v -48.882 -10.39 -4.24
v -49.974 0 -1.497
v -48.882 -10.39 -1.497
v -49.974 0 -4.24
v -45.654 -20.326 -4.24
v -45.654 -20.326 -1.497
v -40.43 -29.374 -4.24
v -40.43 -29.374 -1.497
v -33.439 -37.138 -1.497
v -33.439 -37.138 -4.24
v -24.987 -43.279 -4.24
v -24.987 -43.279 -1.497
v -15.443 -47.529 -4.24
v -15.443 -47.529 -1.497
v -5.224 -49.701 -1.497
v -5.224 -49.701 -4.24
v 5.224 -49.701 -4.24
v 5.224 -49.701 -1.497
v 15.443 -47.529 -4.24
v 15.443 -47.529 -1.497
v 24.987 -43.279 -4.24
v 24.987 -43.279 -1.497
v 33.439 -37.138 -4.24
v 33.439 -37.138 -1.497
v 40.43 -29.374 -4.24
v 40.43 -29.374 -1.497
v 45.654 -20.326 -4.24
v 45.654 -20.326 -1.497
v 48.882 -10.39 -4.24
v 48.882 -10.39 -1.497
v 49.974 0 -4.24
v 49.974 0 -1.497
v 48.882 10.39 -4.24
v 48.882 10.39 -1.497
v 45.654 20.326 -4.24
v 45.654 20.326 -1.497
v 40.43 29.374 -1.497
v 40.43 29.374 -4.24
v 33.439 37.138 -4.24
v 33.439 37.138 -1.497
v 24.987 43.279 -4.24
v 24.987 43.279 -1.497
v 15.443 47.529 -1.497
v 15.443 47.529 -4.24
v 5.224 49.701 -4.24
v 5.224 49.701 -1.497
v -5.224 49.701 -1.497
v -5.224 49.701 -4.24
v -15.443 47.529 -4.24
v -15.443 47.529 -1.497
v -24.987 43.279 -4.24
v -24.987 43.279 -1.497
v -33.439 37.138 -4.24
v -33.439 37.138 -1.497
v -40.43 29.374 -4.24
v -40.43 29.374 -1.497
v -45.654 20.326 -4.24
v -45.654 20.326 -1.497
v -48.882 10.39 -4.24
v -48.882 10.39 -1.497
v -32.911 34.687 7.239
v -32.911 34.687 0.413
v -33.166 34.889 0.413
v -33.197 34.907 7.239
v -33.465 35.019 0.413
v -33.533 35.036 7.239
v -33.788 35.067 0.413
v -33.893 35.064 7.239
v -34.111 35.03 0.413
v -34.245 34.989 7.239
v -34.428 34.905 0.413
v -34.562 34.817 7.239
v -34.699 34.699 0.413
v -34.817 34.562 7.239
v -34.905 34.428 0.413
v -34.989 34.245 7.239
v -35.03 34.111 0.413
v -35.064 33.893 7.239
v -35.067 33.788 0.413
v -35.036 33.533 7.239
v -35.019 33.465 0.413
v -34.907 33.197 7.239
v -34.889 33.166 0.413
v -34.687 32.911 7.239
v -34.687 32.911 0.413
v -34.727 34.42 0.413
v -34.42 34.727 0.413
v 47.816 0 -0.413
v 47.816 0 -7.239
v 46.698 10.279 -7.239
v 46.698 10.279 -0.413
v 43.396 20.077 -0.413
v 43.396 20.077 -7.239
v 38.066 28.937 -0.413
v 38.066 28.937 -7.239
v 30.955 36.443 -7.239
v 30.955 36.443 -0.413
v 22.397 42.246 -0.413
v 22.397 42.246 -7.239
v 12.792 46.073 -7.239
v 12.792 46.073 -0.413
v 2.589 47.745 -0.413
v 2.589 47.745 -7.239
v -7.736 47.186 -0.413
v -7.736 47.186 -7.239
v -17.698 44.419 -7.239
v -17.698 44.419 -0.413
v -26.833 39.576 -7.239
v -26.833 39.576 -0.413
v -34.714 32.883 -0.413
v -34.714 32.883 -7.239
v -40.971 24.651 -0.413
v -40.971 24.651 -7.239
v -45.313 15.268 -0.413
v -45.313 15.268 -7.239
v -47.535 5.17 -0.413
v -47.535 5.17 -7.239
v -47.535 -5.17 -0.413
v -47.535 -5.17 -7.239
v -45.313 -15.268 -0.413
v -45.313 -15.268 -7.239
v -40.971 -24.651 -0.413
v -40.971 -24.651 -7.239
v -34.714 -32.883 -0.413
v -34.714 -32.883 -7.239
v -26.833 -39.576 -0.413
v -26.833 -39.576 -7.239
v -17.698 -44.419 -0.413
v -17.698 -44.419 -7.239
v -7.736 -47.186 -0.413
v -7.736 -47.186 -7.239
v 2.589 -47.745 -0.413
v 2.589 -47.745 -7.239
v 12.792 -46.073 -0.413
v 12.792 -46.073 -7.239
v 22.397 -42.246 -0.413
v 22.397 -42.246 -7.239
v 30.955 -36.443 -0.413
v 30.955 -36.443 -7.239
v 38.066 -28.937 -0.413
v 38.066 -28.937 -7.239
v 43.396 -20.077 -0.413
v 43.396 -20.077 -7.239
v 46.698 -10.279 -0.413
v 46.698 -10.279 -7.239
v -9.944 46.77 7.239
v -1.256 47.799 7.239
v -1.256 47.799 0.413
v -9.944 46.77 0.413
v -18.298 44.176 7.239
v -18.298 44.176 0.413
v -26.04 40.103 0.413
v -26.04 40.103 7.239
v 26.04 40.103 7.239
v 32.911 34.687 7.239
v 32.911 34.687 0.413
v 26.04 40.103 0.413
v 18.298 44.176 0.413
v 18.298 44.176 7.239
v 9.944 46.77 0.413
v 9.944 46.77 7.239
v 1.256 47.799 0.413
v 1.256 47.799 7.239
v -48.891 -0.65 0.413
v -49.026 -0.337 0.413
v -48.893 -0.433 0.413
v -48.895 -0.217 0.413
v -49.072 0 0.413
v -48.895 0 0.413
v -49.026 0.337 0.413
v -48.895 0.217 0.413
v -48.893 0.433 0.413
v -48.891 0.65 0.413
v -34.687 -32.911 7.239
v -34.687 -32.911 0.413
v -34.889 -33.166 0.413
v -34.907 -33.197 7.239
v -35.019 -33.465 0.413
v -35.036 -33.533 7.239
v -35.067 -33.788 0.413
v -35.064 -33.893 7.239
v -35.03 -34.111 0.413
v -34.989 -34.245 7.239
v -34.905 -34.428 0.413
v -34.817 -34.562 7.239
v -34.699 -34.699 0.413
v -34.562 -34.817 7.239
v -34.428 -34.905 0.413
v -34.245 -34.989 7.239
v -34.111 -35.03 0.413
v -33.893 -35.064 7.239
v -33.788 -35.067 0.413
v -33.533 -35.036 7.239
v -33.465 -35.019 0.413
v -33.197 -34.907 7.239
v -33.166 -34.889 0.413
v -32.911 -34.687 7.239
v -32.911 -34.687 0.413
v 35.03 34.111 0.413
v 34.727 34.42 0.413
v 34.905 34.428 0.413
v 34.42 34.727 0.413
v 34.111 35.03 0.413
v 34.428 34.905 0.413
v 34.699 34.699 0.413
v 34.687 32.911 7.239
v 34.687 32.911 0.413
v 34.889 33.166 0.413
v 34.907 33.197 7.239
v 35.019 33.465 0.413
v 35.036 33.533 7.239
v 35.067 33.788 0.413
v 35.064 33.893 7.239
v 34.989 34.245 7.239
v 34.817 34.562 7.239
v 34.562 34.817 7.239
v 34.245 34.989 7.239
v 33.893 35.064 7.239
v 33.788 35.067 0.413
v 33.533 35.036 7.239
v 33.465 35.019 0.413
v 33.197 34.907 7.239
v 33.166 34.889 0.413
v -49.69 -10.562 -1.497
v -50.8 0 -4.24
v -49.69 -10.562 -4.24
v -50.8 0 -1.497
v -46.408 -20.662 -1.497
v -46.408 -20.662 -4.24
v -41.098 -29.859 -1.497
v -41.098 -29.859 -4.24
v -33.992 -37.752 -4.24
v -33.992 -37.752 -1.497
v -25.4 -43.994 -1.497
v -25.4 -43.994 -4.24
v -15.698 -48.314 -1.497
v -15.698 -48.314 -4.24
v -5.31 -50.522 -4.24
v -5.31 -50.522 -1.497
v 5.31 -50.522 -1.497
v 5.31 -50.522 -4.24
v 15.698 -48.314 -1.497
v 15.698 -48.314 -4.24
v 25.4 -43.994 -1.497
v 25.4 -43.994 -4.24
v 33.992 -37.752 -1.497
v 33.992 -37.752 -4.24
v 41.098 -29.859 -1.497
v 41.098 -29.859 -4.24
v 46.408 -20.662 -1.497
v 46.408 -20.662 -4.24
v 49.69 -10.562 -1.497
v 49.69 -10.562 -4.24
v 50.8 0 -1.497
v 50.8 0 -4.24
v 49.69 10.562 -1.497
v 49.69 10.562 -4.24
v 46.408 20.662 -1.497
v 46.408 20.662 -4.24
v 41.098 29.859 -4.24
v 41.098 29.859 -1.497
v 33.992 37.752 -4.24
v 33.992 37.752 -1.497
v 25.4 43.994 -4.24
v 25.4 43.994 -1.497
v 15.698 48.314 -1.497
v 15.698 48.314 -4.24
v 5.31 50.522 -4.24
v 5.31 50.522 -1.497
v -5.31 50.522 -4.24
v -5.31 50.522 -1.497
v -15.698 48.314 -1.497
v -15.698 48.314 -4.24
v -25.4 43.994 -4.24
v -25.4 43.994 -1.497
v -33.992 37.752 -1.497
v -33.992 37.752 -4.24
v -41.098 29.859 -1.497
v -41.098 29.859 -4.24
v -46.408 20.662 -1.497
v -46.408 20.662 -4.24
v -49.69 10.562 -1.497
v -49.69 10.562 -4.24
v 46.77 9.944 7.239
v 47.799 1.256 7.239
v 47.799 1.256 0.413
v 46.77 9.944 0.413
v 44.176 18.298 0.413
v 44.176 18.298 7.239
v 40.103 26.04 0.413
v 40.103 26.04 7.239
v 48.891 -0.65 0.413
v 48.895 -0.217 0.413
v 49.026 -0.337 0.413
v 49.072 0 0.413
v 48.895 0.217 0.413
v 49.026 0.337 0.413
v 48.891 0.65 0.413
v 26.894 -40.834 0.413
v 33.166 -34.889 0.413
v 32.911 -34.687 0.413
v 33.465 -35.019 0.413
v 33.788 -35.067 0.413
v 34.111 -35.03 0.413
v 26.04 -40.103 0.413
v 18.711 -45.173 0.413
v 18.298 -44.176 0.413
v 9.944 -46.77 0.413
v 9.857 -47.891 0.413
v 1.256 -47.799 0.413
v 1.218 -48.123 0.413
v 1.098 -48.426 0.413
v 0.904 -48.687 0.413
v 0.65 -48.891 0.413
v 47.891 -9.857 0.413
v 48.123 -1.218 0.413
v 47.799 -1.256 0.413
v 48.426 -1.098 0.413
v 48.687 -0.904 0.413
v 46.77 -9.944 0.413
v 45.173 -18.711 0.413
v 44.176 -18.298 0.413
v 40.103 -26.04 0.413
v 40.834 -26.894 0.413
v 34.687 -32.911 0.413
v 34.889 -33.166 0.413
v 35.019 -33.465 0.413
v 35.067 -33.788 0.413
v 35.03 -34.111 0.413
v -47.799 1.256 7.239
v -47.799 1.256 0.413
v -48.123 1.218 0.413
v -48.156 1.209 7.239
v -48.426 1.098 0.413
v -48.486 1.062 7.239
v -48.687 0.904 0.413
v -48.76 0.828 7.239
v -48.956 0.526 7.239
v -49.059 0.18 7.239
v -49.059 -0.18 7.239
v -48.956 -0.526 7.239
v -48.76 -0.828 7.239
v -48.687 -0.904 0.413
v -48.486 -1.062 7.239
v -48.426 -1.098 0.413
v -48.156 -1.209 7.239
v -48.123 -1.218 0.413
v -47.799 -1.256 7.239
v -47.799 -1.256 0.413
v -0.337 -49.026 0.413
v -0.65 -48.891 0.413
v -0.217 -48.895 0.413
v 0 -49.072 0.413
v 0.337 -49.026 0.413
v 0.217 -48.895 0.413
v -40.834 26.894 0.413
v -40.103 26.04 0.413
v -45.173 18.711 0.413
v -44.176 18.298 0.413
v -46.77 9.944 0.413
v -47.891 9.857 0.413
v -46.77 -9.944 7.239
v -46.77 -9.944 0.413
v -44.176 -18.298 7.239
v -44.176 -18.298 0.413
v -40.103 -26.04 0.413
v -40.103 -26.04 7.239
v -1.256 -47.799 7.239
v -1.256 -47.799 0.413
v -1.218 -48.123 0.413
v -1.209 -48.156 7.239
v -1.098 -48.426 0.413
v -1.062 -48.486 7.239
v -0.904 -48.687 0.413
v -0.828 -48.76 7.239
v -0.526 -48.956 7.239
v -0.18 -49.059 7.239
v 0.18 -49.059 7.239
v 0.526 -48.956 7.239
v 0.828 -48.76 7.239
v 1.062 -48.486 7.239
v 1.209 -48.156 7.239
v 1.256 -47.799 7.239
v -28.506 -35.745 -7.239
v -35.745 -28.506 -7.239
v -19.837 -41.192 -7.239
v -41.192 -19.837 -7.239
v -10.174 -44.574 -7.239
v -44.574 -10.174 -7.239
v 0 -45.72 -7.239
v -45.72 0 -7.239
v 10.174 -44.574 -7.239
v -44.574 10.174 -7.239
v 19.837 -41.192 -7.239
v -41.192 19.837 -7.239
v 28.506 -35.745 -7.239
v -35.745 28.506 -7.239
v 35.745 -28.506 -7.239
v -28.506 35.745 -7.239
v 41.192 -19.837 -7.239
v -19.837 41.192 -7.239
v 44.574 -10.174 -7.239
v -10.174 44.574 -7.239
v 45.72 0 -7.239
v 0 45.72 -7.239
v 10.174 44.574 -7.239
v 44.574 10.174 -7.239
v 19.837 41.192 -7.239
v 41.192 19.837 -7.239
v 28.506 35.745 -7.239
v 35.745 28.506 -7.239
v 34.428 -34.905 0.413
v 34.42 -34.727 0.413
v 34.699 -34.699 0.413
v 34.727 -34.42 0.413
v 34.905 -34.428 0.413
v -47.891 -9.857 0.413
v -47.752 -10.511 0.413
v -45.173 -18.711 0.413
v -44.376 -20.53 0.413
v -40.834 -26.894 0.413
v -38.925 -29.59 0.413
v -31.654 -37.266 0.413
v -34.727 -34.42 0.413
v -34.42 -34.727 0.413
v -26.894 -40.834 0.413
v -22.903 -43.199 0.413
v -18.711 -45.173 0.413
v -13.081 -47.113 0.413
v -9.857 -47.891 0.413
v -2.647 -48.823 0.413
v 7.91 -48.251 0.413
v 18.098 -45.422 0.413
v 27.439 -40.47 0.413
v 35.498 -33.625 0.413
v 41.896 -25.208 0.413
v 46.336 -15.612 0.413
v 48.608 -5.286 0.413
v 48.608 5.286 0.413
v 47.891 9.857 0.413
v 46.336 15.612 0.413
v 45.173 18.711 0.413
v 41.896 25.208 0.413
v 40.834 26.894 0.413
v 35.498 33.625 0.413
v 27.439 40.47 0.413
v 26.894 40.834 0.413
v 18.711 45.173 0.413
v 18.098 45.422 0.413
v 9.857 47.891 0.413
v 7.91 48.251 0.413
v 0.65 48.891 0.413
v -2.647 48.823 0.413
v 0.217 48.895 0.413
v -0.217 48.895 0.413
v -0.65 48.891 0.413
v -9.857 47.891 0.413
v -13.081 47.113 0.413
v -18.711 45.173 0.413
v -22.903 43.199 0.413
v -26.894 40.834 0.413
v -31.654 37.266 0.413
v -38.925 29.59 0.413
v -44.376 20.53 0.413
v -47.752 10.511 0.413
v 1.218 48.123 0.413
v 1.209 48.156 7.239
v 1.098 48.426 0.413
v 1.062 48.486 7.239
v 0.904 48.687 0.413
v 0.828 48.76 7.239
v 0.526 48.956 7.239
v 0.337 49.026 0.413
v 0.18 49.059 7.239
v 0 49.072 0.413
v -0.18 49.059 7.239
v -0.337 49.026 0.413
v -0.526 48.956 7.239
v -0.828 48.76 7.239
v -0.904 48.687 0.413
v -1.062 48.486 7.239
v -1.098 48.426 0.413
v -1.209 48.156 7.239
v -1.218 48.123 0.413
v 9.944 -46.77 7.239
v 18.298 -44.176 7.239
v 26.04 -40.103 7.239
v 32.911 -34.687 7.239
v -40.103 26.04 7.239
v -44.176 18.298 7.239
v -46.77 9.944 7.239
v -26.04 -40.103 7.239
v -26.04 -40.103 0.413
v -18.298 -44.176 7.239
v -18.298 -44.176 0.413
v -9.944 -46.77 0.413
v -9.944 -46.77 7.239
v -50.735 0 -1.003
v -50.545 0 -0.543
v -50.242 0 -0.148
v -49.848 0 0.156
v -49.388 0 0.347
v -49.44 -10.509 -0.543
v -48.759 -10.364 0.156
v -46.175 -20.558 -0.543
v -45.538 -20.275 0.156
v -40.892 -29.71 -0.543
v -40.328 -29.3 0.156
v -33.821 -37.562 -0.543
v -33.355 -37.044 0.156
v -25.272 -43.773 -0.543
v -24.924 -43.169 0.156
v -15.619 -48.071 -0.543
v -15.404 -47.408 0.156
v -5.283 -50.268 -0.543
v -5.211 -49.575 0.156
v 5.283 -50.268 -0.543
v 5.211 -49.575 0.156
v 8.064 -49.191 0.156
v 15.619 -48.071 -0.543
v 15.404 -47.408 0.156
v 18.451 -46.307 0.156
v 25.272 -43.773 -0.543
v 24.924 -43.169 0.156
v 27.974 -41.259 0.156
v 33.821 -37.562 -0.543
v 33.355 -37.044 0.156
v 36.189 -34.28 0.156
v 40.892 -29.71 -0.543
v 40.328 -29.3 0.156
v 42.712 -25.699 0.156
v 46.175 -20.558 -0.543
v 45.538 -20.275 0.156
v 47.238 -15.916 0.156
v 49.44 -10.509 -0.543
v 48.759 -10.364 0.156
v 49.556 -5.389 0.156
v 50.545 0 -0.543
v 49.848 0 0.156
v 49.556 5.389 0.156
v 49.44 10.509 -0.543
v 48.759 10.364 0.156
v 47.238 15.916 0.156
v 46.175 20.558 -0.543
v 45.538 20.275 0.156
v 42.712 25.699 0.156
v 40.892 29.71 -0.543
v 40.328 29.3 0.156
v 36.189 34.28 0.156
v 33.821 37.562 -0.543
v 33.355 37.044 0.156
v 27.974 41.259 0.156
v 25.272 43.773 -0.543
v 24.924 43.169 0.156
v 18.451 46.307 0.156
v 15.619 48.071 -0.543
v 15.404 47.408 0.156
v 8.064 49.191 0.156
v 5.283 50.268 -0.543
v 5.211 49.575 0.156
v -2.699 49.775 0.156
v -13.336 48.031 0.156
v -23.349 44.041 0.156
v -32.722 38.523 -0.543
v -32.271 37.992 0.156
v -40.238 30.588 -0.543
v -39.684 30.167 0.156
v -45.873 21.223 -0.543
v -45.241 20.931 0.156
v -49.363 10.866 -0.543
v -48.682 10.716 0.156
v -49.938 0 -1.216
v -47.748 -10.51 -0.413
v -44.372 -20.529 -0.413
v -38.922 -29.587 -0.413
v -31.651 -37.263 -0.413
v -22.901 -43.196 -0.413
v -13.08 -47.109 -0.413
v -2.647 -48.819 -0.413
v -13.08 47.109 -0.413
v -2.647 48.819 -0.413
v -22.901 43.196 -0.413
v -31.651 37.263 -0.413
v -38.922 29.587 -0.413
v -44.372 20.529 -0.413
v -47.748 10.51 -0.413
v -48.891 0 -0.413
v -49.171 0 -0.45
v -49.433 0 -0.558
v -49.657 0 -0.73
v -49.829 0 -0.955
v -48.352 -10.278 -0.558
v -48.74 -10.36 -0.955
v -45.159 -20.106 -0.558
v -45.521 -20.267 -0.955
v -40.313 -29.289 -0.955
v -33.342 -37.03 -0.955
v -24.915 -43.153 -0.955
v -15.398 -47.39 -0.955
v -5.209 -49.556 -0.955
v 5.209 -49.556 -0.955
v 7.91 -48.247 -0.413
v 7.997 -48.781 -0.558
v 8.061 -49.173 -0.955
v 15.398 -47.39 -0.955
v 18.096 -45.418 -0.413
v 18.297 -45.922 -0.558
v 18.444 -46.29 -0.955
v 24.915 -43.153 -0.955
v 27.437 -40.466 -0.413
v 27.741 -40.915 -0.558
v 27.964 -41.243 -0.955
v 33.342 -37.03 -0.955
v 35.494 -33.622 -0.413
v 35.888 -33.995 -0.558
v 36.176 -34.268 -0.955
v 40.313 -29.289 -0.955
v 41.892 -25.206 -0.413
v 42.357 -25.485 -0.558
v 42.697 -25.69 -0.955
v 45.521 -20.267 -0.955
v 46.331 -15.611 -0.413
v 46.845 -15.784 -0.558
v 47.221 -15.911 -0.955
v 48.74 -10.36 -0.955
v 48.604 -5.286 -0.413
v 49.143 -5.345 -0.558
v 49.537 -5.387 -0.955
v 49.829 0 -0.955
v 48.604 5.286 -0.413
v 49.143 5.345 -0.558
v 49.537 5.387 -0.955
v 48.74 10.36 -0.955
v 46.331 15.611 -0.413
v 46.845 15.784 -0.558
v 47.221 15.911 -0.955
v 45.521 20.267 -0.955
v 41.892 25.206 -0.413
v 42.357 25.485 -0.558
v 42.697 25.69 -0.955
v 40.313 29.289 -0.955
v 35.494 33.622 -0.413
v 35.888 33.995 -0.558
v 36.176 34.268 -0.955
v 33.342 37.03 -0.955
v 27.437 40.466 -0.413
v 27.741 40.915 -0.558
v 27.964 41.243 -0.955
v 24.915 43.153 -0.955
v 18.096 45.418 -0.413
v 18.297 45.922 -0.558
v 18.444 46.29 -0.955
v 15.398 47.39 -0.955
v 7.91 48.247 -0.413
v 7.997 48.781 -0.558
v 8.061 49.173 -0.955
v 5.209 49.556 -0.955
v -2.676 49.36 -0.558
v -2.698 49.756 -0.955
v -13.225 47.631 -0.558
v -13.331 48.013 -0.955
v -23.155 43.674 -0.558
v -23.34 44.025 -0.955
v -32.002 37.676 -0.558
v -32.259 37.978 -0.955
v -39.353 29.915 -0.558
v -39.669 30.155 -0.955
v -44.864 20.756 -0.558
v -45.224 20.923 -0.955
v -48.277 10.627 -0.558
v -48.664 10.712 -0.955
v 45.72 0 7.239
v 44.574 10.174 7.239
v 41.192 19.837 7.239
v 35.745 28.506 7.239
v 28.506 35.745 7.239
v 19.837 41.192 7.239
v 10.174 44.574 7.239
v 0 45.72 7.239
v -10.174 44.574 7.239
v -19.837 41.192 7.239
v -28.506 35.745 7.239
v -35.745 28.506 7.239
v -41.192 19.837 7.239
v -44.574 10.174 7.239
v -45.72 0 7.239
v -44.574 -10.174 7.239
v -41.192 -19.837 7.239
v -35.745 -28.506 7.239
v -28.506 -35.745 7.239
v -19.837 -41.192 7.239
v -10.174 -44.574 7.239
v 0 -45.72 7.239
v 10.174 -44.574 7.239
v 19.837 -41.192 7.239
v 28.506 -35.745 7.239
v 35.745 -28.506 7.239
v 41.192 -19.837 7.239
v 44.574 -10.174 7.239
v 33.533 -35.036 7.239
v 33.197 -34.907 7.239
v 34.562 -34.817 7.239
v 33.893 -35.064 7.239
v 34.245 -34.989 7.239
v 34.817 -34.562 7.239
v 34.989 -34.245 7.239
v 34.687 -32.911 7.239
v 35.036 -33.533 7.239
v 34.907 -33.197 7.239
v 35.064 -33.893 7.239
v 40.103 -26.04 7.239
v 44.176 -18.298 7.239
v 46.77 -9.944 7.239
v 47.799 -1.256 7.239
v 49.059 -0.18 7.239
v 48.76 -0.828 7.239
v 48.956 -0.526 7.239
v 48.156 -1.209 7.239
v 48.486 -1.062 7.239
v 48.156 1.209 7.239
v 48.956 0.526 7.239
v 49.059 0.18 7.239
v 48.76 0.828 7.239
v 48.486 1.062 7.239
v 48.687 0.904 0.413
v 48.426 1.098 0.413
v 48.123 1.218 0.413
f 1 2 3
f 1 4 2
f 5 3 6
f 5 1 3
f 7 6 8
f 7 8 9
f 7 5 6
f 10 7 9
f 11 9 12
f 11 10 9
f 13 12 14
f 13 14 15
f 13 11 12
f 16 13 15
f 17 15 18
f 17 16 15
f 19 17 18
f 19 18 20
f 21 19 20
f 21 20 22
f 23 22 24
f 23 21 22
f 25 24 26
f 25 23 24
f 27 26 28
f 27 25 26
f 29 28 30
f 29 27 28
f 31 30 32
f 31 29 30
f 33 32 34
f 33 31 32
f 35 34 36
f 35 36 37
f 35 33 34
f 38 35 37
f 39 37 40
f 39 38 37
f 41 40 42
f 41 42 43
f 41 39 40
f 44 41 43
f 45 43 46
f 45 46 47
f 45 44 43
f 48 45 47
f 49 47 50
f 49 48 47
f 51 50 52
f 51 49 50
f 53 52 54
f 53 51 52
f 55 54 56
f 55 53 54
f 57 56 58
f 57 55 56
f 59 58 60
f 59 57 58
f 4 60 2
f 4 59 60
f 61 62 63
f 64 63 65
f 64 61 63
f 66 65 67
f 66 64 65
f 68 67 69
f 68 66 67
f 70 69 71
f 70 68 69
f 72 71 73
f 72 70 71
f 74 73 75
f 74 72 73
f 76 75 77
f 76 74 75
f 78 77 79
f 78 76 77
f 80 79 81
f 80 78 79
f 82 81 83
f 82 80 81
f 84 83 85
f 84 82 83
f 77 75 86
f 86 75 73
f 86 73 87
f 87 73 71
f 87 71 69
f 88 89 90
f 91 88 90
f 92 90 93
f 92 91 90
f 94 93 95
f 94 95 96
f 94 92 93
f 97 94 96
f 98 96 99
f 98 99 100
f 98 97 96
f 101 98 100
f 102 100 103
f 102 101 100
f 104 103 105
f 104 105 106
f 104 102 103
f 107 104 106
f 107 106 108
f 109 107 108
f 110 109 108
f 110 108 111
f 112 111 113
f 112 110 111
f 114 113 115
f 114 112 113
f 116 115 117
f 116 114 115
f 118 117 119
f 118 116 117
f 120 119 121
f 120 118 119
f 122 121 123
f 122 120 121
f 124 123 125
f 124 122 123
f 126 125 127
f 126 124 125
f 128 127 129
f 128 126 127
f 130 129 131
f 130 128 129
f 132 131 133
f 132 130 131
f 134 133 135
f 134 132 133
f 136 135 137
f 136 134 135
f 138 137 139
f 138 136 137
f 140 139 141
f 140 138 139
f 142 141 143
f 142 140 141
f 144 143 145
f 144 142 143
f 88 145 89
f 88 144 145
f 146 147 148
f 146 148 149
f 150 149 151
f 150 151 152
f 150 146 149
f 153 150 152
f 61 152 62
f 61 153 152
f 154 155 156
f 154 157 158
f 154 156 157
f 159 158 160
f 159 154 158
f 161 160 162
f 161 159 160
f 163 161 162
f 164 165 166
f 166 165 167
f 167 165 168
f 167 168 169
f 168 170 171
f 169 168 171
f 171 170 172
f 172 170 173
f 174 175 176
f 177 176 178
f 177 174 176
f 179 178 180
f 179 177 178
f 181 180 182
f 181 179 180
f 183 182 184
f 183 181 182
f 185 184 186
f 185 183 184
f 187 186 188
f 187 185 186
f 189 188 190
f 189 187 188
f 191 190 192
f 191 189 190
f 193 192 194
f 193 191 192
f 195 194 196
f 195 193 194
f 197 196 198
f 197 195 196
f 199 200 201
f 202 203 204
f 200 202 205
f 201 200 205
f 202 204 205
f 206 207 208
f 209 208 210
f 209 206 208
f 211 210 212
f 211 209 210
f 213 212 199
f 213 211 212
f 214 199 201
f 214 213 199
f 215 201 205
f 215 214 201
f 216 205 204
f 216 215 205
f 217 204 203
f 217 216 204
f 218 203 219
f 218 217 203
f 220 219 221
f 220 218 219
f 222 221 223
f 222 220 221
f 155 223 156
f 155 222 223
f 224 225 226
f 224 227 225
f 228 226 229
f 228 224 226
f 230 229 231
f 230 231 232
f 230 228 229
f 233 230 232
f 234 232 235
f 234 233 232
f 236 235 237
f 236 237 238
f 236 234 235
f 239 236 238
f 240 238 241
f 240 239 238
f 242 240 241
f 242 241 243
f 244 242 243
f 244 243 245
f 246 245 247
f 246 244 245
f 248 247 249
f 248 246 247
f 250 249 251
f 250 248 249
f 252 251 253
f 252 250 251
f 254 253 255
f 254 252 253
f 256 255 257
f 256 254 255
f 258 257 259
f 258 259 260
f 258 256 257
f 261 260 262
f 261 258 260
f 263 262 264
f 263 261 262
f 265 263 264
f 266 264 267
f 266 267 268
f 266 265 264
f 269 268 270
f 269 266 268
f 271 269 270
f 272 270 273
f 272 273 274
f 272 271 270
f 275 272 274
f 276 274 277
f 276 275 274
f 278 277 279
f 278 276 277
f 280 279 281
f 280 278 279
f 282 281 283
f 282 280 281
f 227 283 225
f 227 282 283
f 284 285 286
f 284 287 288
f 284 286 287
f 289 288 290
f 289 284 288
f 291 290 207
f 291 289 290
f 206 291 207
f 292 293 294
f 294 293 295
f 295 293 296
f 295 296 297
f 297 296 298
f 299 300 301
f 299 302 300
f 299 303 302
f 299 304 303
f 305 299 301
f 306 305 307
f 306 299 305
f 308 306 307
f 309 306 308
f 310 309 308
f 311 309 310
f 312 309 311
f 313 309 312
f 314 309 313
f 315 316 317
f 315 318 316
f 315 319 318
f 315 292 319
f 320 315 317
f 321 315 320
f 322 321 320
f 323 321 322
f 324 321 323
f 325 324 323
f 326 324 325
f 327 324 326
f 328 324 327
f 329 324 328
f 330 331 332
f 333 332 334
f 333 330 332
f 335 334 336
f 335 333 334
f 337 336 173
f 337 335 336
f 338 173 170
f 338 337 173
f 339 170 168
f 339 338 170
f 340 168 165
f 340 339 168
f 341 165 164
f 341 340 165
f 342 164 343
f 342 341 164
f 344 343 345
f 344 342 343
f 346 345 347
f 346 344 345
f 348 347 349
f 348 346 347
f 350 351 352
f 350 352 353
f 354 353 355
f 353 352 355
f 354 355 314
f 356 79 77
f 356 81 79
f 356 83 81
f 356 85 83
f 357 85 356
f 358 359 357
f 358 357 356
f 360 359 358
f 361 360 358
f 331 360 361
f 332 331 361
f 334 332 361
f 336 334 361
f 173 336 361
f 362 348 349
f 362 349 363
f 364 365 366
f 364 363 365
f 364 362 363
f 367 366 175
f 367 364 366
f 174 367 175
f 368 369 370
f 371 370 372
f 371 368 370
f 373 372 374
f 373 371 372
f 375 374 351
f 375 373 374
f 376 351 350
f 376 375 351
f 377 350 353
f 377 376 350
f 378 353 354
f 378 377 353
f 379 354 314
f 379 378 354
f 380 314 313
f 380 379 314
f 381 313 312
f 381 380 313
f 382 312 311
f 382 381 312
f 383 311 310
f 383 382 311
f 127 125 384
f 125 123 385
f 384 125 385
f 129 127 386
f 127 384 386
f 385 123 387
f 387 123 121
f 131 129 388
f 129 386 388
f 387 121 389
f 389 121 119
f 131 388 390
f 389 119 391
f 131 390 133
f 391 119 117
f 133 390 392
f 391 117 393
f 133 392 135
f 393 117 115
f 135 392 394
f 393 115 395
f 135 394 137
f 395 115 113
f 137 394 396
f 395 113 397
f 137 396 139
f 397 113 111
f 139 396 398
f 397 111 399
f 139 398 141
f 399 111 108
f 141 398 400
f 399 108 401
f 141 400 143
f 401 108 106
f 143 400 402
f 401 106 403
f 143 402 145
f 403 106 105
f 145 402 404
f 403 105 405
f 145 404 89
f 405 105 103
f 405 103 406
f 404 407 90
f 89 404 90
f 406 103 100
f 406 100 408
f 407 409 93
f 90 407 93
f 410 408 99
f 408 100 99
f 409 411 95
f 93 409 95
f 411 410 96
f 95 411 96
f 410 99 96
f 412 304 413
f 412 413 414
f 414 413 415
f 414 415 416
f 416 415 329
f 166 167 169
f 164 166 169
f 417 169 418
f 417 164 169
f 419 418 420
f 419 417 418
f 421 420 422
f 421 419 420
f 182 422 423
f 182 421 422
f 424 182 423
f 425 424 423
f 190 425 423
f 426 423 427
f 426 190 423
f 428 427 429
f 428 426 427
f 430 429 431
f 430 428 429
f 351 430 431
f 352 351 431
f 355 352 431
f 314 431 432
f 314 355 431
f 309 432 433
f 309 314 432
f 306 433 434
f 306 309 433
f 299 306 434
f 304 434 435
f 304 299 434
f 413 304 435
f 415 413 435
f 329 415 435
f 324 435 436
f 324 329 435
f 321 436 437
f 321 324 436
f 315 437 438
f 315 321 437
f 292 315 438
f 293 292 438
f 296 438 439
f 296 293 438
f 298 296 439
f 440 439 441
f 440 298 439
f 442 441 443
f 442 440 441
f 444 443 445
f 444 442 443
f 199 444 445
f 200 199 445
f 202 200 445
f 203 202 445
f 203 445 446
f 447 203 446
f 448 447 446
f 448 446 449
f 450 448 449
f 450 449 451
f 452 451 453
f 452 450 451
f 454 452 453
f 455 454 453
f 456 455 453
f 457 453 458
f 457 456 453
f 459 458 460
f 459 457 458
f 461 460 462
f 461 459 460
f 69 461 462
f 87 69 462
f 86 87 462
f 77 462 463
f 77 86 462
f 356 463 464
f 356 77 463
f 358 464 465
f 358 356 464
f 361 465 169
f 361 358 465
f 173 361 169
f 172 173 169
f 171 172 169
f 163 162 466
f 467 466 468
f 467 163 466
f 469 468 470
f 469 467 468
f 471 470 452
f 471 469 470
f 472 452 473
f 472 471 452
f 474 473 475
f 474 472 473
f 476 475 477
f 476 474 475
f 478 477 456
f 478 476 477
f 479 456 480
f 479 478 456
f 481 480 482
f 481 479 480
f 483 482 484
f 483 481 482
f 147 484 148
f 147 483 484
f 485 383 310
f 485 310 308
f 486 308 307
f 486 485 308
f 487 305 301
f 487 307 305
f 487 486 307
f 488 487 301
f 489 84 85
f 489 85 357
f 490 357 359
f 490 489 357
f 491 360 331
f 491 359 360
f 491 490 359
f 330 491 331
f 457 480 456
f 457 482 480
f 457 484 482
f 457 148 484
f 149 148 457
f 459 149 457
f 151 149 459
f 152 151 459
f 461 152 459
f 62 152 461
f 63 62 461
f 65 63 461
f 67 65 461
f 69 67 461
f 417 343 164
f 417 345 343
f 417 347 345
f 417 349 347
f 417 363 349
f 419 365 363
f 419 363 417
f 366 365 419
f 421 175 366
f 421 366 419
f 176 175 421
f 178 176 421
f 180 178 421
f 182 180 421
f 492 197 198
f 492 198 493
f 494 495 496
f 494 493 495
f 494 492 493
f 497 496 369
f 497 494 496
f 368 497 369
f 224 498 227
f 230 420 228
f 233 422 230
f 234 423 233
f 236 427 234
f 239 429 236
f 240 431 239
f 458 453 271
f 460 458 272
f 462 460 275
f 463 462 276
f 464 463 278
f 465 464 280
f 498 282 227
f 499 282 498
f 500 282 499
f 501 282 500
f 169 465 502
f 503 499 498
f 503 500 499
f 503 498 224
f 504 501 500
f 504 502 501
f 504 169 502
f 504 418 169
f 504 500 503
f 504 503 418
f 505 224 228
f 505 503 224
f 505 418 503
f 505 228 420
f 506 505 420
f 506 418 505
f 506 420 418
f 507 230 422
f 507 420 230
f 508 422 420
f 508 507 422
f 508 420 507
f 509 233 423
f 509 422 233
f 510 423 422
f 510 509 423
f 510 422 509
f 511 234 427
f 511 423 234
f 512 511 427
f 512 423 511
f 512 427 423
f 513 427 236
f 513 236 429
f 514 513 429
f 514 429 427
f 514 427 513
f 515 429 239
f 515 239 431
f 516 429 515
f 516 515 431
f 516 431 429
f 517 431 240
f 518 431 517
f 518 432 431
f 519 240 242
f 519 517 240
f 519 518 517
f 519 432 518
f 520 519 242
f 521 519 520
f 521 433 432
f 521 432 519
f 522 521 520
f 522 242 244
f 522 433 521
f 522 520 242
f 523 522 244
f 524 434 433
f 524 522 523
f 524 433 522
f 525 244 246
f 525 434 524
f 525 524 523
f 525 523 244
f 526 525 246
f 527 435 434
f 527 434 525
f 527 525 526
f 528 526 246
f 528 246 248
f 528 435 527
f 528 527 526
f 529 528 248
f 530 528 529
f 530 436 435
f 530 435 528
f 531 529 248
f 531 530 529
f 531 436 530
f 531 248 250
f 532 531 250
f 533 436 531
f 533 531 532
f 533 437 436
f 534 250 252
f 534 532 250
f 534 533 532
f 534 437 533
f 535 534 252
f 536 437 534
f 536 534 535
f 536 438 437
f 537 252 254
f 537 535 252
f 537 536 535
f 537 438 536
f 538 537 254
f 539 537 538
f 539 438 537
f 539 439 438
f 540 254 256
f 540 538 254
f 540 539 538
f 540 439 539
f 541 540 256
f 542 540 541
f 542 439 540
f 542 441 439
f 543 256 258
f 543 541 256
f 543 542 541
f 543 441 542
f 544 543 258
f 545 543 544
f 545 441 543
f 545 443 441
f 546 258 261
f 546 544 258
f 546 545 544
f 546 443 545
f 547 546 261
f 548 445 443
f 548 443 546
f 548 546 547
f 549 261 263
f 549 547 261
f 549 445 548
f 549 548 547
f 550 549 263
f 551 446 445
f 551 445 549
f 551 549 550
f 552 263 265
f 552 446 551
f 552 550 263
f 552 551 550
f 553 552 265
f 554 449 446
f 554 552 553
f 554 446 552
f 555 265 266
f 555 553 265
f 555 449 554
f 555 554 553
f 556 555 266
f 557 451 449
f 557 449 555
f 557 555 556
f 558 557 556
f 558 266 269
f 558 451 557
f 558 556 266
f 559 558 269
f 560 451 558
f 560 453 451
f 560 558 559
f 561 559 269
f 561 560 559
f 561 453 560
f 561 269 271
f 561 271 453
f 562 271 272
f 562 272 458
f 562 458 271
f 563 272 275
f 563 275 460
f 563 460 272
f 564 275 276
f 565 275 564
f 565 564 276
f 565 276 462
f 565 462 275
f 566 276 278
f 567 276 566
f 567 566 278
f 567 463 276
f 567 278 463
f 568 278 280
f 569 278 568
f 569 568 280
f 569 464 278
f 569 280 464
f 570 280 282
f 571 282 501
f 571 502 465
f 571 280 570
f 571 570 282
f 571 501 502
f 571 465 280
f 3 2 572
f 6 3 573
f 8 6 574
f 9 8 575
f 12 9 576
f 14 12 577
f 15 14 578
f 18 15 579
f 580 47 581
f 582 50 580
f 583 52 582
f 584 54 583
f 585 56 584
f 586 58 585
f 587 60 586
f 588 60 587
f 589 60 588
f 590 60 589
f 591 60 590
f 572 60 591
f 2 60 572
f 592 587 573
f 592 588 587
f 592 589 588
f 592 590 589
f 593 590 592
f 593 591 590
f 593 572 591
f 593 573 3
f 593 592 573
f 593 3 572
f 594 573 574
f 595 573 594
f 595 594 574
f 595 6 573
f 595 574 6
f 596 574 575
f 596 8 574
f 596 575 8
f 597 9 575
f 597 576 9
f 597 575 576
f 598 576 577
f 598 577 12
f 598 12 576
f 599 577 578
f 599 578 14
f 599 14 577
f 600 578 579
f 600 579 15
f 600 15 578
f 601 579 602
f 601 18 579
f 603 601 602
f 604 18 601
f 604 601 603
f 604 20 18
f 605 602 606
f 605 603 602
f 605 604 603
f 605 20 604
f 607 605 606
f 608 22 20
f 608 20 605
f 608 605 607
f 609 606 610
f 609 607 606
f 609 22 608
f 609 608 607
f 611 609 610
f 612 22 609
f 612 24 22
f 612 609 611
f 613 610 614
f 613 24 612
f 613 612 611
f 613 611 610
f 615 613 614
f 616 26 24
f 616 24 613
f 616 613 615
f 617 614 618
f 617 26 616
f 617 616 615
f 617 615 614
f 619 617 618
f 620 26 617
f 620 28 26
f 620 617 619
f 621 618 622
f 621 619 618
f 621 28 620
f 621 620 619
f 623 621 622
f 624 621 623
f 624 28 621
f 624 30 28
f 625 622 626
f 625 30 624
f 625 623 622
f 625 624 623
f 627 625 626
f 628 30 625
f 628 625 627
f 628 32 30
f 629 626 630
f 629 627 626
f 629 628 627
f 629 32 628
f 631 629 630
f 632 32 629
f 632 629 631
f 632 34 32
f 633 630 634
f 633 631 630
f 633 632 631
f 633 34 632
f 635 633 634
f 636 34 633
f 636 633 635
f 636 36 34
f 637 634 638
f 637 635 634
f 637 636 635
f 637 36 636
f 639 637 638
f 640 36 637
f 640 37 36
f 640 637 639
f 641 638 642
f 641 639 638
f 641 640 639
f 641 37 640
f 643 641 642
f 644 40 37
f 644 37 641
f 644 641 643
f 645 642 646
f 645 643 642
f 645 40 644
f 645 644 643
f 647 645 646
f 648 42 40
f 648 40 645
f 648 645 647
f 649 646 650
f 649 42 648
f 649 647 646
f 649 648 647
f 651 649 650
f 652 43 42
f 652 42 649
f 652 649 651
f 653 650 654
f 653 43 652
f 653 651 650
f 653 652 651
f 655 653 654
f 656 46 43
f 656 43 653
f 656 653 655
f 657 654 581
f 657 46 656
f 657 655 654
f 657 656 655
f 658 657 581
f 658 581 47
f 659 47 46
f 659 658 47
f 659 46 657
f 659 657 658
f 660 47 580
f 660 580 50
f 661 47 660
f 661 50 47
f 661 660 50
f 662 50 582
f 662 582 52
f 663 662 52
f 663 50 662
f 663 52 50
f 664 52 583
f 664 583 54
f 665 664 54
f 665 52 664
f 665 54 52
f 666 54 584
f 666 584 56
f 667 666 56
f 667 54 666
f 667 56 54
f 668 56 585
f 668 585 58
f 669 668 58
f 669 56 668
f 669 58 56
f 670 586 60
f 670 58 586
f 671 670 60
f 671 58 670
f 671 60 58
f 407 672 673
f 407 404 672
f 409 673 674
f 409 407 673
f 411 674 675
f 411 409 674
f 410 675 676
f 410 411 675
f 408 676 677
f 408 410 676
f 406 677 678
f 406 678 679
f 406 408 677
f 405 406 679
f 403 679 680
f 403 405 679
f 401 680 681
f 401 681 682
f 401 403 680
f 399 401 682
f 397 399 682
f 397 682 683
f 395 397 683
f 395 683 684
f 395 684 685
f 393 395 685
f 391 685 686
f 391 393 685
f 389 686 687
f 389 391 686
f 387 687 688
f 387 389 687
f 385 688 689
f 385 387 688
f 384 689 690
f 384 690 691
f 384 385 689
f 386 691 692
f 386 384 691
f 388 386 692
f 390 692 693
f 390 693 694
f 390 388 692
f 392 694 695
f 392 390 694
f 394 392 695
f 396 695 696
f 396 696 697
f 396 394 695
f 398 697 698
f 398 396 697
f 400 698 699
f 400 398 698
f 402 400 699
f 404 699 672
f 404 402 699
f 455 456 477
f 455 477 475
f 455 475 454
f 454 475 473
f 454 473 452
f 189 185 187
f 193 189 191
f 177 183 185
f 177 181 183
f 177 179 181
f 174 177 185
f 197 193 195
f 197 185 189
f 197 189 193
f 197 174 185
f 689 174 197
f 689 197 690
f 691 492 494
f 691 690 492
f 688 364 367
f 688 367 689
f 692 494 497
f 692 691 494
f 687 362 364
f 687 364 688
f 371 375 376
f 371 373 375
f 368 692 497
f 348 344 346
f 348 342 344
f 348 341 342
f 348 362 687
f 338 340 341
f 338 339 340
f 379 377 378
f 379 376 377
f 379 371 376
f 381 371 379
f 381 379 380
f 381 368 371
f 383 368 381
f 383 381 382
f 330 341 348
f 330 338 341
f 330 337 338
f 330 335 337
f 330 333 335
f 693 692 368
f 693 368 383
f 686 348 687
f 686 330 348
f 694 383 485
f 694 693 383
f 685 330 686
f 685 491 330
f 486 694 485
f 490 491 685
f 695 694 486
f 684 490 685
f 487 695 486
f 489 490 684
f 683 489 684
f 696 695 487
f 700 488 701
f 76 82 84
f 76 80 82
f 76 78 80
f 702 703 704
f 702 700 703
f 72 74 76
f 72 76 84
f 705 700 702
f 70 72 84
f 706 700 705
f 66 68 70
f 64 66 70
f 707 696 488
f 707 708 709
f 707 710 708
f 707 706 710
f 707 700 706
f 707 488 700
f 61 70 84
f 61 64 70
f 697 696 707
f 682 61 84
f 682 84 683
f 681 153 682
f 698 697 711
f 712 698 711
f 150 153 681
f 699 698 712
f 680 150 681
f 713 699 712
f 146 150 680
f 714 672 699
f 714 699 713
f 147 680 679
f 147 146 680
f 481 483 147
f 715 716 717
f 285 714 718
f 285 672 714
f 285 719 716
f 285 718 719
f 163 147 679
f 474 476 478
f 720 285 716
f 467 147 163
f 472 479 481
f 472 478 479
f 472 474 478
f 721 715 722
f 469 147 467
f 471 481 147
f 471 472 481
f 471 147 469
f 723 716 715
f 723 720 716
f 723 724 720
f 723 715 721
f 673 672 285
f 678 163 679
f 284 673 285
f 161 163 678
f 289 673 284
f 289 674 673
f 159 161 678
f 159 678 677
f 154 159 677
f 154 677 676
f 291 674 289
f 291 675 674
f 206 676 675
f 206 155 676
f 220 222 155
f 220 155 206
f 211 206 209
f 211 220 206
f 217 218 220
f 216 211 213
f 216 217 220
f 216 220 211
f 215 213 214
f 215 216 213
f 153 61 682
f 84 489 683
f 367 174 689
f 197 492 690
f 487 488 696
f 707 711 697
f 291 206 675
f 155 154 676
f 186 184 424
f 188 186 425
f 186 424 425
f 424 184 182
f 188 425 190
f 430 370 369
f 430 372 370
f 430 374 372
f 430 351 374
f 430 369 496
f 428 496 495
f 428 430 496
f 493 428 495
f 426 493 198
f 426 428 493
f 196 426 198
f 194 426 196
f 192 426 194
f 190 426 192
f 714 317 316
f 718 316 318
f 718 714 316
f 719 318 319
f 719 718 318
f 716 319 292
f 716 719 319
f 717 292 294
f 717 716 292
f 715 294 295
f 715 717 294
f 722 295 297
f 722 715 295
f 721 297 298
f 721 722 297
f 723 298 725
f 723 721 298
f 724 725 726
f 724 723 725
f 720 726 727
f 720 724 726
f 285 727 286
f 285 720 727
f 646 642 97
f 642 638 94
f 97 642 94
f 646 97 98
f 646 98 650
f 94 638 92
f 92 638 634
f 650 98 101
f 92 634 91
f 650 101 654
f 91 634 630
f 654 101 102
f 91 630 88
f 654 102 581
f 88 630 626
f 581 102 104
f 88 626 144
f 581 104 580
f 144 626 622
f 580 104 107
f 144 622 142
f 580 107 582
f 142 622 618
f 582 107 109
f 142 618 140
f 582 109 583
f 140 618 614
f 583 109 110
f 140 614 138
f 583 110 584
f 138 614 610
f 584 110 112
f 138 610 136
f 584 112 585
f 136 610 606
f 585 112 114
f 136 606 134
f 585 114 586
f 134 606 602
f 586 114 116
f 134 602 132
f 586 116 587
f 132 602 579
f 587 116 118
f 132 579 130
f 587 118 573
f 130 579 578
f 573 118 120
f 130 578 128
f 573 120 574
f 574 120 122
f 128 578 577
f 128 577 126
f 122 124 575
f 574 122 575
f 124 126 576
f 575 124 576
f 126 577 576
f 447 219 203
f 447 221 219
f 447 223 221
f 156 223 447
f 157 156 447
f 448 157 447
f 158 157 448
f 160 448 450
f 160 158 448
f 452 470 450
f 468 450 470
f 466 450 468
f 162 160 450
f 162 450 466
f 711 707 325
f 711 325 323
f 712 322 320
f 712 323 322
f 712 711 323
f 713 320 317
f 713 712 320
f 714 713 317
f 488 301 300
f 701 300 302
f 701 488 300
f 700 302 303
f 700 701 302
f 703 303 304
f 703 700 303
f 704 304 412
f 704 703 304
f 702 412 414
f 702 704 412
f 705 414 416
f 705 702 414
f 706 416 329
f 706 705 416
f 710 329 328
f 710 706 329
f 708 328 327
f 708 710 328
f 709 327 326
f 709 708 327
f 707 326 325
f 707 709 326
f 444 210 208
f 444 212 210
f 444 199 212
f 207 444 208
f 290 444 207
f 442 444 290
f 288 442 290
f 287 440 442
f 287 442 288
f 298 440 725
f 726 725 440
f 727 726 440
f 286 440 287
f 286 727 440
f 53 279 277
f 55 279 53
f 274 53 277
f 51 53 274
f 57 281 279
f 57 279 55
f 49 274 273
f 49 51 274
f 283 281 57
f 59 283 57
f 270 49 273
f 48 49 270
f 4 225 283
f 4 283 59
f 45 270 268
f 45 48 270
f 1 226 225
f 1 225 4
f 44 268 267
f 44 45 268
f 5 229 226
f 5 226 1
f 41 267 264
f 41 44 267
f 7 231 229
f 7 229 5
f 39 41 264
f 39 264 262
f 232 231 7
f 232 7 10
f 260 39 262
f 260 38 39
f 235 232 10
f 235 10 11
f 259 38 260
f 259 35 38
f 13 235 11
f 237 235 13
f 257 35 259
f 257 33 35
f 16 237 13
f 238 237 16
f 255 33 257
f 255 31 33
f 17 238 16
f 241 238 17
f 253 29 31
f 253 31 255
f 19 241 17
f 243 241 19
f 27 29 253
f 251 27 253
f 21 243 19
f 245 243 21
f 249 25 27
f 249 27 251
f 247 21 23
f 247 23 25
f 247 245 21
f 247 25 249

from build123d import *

# Parameters (mm, degrees)
SKETCH1_R           = 47.8155
SKETCH1_R_2         = 45.72
BOSS_EXTRUDE1_DEPTH = 7.239
SKETCH2_R           = 53.975
SKETCH2_R_2         = 47.8155
BOSS_EXTRUDE2_DEPTH = 0.41275
BOSS_EXTRUDE3_REACH = 79.693
SKETCH3_R           = 1.256285172
CIRPATTERN1_COUNT   = 8
MOVE_FACE1_BY       = 5.08


with BuildPart() as part:
    # Sketch1 → Boss-Extrude1 (new, symmetric)
    with BuildSketch(Plane.XY):
        Circle(SKETCH1_R)
        Circle(SKETCH1_R_2, mode=Mode.SUBTRACT)
    extrude(amount=BOSS_EXTRUDE1_DEPTH, both=True)

    # Sketch2 → Boss-Extrude2 (add, symmetric)
    with BuildSketch(Plane.XY):
        with Locations(Location((0, 0, 0), (0, 0, 180))):
            Circle(SKETCH2_R)
        Circle(SKETCH2_R_2, mode=Mode.SUBTRACT)
    extrude(amount=BOSS_EXTRUDE2_DEPTH, both=True)

    # Sketch3 → Boss-Extrude3 (add, up to next)
    with BuildSketch(Plane.XY.offset(7.239), mode=Mode.PRIVATE) as boss_extrude3_sk1:
        with Locations((0, 47.8155)):
            Circle(SKETCH3_R)
    boss_extrude3_tool1 = extrude(boss_extrude3_sk1.sketch, amount=-BOSS_EXTRUDE3_REACH, mode=Mode.PRIVATE) - part.part
    boss_extrude3 = boss_extrude3_tool1.solids().sort_by_distance((0, 47.8155, 7.239))[0]
    add(boss_extrude3)

    # CirPattern1: Boss-Extrude3 ×8 about axis
    cirpattern1_axis = Axis((0, 0, 0), (0, 0, 1))
    for i in range(1, CIRPATTERN1_COUNT):
        add(boss_extrude3.rotate(cirpattern1_axis, i * 360 / CIRPATTERN1_COUNT))

    # Move Face1: a curved face moved inward by 5.08
    add(Solid.thicken(part.faces().sort_by_distance((53.975, 0, 0))[0], -MOVE_FACE1_BY), mode=Mode.SUBTRACT)

    # Sketch4 → Revolve2 (revolve)
    with BuildSketch(Plane(origin=(0, 0, 0), x_dir=(0, 0, -1), z_dir=(1, 0, 0)), mode=Mode.PRIVATE) as revolve2_sk:
        with BuildLine():
            Line((-0.41275, 48.890682026), (0.41275, 48.890682026))
            ThreePointArc((0.41275, 48.890682026), (0.730192935, 49.657057065), (1.496567974, 49.9745))
            Line((1.496567974, 49.9745), (4.240158679, 49.9745))
            Line((4.240158679, 49.9745), (4.240158679, 50.8))
            Line((4.240158679, 50.8), (1.496567974, 50.8))
            ThreePointArc((1.496567974, 50.8), (0.146476287, 50.240773713), (-0.41275, 48.890682026))
        make_face()
    revolve(revolve2_sk.sketch.rotate(Axis((0, 0, -29.740513721), (0, 0, 1)), 90), axis=Axis((0, 0, -29.740513721), (0, 0, 1)))


solid = part.part
